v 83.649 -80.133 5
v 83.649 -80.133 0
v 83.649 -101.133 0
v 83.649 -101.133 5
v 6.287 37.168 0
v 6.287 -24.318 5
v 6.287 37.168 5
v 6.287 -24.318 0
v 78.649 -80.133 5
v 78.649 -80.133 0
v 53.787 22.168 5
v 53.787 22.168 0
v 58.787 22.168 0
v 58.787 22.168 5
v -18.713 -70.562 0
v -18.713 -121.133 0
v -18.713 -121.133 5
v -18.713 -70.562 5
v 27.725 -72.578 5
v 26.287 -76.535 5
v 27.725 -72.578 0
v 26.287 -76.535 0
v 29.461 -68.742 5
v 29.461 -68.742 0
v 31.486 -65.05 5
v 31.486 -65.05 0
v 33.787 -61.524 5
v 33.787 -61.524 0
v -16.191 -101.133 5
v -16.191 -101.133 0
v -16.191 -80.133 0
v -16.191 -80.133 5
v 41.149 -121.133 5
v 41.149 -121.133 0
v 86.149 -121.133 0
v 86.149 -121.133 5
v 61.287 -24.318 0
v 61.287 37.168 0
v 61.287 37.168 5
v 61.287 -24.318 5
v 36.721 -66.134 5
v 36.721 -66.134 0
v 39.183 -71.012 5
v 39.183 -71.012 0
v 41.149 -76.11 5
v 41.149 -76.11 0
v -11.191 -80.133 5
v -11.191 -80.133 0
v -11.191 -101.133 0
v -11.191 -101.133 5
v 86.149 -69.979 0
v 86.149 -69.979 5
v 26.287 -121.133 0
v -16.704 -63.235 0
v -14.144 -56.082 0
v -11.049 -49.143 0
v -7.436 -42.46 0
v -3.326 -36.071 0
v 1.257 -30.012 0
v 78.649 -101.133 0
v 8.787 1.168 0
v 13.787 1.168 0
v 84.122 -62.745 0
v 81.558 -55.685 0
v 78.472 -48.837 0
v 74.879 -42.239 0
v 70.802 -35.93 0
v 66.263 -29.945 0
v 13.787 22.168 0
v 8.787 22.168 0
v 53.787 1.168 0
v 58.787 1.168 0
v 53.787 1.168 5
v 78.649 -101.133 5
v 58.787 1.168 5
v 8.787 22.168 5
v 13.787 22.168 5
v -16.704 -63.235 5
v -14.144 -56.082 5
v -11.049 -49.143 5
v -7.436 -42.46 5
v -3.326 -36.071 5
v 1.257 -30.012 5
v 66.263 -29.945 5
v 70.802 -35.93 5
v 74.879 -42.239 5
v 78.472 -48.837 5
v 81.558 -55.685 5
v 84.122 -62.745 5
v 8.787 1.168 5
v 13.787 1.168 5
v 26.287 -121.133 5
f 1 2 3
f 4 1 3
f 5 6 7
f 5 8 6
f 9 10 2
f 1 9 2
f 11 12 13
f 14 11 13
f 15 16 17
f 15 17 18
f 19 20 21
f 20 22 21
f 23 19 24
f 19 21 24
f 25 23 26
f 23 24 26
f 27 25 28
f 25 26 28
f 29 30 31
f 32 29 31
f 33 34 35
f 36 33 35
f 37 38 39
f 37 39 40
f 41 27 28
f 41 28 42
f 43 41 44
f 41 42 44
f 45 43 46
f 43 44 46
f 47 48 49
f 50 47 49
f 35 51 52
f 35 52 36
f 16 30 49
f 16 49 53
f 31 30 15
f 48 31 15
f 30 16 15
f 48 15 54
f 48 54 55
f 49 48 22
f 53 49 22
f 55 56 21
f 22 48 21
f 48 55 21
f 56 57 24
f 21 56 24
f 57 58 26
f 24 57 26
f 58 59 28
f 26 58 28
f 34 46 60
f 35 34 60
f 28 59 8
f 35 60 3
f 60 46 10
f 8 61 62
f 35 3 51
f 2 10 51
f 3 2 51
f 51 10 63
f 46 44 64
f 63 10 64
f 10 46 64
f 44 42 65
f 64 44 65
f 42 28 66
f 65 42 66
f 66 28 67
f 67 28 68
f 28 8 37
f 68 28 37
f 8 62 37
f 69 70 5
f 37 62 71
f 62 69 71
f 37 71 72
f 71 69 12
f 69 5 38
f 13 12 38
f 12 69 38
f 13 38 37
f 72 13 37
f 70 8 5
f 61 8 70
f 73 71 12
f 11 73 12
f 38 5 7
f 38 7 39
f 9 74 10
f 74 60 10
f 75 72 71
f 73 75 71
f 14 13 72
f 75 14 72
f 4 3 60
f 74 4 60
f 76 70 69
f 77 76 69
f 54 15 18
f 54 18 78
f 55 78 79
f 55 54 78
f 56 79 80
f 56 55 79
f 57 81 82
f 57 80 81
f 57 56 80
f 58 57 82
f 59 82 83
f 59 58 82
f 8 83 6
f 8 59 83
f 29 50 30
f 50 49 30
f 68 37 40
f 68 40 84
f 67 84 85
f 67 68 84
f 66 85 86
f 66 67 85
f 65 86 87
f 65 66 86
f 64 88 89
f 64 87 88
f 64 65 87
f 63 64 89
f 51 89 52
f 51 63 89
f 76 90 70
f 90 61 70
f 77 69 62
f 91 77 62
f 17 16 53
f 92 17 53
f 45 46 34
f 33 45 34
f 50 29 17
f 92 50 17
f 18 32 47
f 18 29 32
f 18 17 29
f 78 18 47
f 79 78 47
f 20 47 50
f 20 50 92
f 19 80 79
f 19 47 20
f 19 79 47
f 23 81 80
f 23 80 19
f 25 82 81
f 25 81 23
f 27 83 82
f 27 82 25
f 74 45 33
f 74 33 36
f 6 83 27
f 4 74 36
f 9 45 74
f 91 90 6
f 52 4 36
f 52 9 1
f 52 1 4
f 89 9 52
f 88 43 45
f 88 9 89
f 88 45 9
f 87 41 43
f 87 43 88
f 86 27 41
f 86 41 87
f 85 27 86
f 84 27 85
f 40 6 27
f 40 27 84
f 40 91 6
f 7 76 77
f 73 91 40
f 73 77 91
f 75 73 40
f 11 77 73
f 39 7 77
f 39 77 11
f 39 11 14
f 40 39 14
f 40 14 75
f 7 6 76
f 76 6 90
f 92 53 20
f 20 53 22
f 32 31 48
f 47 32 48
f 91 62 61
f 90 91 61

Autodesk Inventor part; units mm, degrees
ref_plane "YZ Plane" through (0, 0, 0) normal (1, 0, 0) x (0, 1, 0)
ref_plane "XZ Plane" through (0, 0, 0) normal (0, 1, 0) x (-1, 0, 0)
ref_plane "XY Plane" through (0, 0, 0) normal (0, 0, 1) x (1, 0, 0)
sketch "Sketch1" plane through (0, 0, 0) normal (0, 0, 1) x (1, 0, 0)
  line L0 (51.2872, 31.5555) -> (51.2872, -28.4445)
  line L1 (16.2872, 31.5555) -> (16.2872, -28.4445)
  arc A0 (16.2872, -28.4445) -> (-8.7128, -71.7458) centre (78.6621, -93.3242) ccw
  line L2 (16.2872, -28.4445) -> (-8.7128, -71.7458) construction
  line L3 (16.2872, -28.4445) -> (66.2872, -28.4445) construction
  line L4 (-8.7128, -71.7458) -> (-8.7128, -121.7458)
  arc A1 (76.1491, -71.1938) -> (51.2872, -28.4445) centre (-11.0876, -93.3242) ccw
  line L5 (76.1491, -71.1938) -> (76.1491, -121.1332)
  line L6 (26.2872, -121.7458) -> (26.2872, -76.5352)
  arc A2 (33.7872, -61.5241) -> (26.2872, -76.5352) centre (78.6621, -93.3242) ccw
  arc A3 (41.1491, -76.1101) -> (33.7872, -61.5241) centre (-11.0876, -93.3242) ccw
  line L7 (41.1491, -76.1101) -> (41.1491, -121.1332)
  line L8 (-18.7128, -121.1332) -> (-18.7128, -70.5617)
  arc A4 (6.2872, -24.3178) -> (-18.7128, -70.5617) centre (78.6621, -93.3242) ccw
  line L9 (6.2872, -24.3178) -> (6.2872, 37.168)
  line L10 (6.2872, 37.168) -> (61.2872, 37.168)
  line L11 (61.2872, 37.168) -> (61.2872, -24.3178)
  arc A5 (86.1491, -69.9786) -> (61.2872, -24.3178) centre (-11.0876, -93.3242) ccw
  line L12 (86.1491, -69.9786) -> (86.1491, -121.1332)
  line L13 (-18.7128, -121.1332) -> (86.1491, -121.1332)
  line L14 (16.2872, 31.5555) -> (16.2872, 37.168)
  line L15 (51.2872, 31.5555) -> (51.2872, 37.168)
  line L16 (36.1491, -121.1332) -> (36.1491, -85.5895)
  line L17 (31.2872, -85.5895) -> (31.2872, -121.7458)
  line L18 (26.2872, -85.5895) -> (31.2872, -85.5895)
  line L19 (36.1491, -85.5895) -> (41.1491, -85.5895)
  line L20 (50.9283, 31.5555) -> (51.2872, 31.5555)
  line L21 (16.2872, 2.168) -> (16.2872, 22.168)
  line L22 (51.2872, 2.168) -> (51.2872, 22.168)
  line L23 (76.1491, -101.1332) -> (76.1491, -81.1332)
  line L24 (-8.7128, -81.1332) -> (-8.7128, -101.1332)
  line L25 (78.6491, -80.1332) -> (83.6491, -80.1332)
  line L26 (83.6491, -80.1332) -> (83.6491, -101.1332)
  line L27 (83.6491, -101.1332) -> (78.6491, -101.1332)
  line L28 (78.6491, -101.1332) -> (78.6491, -80.1332)
  line L29 (-16.1906, -80.1332) -> (-11.1906, -80.1332)
  line L30 (-11.1906, -80.1332) -> (-11.1906, -101.1332)
  line L31 (-11.1906, -101.1332) -> (-16.1906, -101.1332)
  line L32 (-16.1906, -101.1332) -> (-16.1906, -80.1332)
  line L33 (53.7872, 22.168) -> (58.7872, 22.168)
  line L34 (58.7872, 22.168) -> (58.7872, 1.168)
  line L35 (58.7872, 1.168) -> (53.7872, 1.168)
  line L36 (53.7872, 1.168) -> (53.7872, 22.168)
  line L37 (8.7872, 22.168) -> (13.7872, 22.168)
  line L38 (13.7872, 22.168) -> (13.7872, 1.168)
  line L39 (13.7872, 1.168) -> (8.7872, 1.168)
  line L40 (8.7872, 1.168) -> (8.7872, 22.168)
  point P0 (0, 0)
  point P1 (-8.7128, -121.1332)
  point P2 (26.2872, -121.1332)
  point P3 (36.2872, -121.7458)
  point P4 (71.2872, -121.7458)
  point P5 (31.2872, -121.1332)
  point P6 (31.2872, -121.7458)
  dimension "d0" = 35
  dimension "d1" = 60
  dimension "d2" = 50
  dimension "d3" = 120
  dimension "d4" = 90
  dimension "d5" = 50
  dimension "d6" = 35
  dimension "d7" = 10
  dimension "d12" = 5
  dimension "d16" = 10
  dimension "d22" = 158.3013
  dimension "d29" = 0
  dimension "d30" = 5
  dimension "d31" = 21
  dimension "d32" = 5
  dimension "d33" = 21
  dimension "d34" = 5
  dimension "d35" = 21
  dimension "d36" = 5
  dimension "d37" = 21
  dimension "d38" = 2.5
  dimension "d39" = 15
  dimension "d40" = 2.5
  dimension "d41" = 15
  dimension "d42" = 20
  dimension "d43" = 20
extrude "Extrusion1" add sketch "Sketch1" along normal blind 5 contours L15 L10 L11 A5 L12 L13 L5 A1 L0 | L0 A1 L5 L13 L7 A3 A2 L6 L4 A0 L1 L14 L10 L15 | L14 L1 A0 L4 L13 L8 A4 L9 L10
equation "\"d16\" = d7"
properties part number "newmiddle"
